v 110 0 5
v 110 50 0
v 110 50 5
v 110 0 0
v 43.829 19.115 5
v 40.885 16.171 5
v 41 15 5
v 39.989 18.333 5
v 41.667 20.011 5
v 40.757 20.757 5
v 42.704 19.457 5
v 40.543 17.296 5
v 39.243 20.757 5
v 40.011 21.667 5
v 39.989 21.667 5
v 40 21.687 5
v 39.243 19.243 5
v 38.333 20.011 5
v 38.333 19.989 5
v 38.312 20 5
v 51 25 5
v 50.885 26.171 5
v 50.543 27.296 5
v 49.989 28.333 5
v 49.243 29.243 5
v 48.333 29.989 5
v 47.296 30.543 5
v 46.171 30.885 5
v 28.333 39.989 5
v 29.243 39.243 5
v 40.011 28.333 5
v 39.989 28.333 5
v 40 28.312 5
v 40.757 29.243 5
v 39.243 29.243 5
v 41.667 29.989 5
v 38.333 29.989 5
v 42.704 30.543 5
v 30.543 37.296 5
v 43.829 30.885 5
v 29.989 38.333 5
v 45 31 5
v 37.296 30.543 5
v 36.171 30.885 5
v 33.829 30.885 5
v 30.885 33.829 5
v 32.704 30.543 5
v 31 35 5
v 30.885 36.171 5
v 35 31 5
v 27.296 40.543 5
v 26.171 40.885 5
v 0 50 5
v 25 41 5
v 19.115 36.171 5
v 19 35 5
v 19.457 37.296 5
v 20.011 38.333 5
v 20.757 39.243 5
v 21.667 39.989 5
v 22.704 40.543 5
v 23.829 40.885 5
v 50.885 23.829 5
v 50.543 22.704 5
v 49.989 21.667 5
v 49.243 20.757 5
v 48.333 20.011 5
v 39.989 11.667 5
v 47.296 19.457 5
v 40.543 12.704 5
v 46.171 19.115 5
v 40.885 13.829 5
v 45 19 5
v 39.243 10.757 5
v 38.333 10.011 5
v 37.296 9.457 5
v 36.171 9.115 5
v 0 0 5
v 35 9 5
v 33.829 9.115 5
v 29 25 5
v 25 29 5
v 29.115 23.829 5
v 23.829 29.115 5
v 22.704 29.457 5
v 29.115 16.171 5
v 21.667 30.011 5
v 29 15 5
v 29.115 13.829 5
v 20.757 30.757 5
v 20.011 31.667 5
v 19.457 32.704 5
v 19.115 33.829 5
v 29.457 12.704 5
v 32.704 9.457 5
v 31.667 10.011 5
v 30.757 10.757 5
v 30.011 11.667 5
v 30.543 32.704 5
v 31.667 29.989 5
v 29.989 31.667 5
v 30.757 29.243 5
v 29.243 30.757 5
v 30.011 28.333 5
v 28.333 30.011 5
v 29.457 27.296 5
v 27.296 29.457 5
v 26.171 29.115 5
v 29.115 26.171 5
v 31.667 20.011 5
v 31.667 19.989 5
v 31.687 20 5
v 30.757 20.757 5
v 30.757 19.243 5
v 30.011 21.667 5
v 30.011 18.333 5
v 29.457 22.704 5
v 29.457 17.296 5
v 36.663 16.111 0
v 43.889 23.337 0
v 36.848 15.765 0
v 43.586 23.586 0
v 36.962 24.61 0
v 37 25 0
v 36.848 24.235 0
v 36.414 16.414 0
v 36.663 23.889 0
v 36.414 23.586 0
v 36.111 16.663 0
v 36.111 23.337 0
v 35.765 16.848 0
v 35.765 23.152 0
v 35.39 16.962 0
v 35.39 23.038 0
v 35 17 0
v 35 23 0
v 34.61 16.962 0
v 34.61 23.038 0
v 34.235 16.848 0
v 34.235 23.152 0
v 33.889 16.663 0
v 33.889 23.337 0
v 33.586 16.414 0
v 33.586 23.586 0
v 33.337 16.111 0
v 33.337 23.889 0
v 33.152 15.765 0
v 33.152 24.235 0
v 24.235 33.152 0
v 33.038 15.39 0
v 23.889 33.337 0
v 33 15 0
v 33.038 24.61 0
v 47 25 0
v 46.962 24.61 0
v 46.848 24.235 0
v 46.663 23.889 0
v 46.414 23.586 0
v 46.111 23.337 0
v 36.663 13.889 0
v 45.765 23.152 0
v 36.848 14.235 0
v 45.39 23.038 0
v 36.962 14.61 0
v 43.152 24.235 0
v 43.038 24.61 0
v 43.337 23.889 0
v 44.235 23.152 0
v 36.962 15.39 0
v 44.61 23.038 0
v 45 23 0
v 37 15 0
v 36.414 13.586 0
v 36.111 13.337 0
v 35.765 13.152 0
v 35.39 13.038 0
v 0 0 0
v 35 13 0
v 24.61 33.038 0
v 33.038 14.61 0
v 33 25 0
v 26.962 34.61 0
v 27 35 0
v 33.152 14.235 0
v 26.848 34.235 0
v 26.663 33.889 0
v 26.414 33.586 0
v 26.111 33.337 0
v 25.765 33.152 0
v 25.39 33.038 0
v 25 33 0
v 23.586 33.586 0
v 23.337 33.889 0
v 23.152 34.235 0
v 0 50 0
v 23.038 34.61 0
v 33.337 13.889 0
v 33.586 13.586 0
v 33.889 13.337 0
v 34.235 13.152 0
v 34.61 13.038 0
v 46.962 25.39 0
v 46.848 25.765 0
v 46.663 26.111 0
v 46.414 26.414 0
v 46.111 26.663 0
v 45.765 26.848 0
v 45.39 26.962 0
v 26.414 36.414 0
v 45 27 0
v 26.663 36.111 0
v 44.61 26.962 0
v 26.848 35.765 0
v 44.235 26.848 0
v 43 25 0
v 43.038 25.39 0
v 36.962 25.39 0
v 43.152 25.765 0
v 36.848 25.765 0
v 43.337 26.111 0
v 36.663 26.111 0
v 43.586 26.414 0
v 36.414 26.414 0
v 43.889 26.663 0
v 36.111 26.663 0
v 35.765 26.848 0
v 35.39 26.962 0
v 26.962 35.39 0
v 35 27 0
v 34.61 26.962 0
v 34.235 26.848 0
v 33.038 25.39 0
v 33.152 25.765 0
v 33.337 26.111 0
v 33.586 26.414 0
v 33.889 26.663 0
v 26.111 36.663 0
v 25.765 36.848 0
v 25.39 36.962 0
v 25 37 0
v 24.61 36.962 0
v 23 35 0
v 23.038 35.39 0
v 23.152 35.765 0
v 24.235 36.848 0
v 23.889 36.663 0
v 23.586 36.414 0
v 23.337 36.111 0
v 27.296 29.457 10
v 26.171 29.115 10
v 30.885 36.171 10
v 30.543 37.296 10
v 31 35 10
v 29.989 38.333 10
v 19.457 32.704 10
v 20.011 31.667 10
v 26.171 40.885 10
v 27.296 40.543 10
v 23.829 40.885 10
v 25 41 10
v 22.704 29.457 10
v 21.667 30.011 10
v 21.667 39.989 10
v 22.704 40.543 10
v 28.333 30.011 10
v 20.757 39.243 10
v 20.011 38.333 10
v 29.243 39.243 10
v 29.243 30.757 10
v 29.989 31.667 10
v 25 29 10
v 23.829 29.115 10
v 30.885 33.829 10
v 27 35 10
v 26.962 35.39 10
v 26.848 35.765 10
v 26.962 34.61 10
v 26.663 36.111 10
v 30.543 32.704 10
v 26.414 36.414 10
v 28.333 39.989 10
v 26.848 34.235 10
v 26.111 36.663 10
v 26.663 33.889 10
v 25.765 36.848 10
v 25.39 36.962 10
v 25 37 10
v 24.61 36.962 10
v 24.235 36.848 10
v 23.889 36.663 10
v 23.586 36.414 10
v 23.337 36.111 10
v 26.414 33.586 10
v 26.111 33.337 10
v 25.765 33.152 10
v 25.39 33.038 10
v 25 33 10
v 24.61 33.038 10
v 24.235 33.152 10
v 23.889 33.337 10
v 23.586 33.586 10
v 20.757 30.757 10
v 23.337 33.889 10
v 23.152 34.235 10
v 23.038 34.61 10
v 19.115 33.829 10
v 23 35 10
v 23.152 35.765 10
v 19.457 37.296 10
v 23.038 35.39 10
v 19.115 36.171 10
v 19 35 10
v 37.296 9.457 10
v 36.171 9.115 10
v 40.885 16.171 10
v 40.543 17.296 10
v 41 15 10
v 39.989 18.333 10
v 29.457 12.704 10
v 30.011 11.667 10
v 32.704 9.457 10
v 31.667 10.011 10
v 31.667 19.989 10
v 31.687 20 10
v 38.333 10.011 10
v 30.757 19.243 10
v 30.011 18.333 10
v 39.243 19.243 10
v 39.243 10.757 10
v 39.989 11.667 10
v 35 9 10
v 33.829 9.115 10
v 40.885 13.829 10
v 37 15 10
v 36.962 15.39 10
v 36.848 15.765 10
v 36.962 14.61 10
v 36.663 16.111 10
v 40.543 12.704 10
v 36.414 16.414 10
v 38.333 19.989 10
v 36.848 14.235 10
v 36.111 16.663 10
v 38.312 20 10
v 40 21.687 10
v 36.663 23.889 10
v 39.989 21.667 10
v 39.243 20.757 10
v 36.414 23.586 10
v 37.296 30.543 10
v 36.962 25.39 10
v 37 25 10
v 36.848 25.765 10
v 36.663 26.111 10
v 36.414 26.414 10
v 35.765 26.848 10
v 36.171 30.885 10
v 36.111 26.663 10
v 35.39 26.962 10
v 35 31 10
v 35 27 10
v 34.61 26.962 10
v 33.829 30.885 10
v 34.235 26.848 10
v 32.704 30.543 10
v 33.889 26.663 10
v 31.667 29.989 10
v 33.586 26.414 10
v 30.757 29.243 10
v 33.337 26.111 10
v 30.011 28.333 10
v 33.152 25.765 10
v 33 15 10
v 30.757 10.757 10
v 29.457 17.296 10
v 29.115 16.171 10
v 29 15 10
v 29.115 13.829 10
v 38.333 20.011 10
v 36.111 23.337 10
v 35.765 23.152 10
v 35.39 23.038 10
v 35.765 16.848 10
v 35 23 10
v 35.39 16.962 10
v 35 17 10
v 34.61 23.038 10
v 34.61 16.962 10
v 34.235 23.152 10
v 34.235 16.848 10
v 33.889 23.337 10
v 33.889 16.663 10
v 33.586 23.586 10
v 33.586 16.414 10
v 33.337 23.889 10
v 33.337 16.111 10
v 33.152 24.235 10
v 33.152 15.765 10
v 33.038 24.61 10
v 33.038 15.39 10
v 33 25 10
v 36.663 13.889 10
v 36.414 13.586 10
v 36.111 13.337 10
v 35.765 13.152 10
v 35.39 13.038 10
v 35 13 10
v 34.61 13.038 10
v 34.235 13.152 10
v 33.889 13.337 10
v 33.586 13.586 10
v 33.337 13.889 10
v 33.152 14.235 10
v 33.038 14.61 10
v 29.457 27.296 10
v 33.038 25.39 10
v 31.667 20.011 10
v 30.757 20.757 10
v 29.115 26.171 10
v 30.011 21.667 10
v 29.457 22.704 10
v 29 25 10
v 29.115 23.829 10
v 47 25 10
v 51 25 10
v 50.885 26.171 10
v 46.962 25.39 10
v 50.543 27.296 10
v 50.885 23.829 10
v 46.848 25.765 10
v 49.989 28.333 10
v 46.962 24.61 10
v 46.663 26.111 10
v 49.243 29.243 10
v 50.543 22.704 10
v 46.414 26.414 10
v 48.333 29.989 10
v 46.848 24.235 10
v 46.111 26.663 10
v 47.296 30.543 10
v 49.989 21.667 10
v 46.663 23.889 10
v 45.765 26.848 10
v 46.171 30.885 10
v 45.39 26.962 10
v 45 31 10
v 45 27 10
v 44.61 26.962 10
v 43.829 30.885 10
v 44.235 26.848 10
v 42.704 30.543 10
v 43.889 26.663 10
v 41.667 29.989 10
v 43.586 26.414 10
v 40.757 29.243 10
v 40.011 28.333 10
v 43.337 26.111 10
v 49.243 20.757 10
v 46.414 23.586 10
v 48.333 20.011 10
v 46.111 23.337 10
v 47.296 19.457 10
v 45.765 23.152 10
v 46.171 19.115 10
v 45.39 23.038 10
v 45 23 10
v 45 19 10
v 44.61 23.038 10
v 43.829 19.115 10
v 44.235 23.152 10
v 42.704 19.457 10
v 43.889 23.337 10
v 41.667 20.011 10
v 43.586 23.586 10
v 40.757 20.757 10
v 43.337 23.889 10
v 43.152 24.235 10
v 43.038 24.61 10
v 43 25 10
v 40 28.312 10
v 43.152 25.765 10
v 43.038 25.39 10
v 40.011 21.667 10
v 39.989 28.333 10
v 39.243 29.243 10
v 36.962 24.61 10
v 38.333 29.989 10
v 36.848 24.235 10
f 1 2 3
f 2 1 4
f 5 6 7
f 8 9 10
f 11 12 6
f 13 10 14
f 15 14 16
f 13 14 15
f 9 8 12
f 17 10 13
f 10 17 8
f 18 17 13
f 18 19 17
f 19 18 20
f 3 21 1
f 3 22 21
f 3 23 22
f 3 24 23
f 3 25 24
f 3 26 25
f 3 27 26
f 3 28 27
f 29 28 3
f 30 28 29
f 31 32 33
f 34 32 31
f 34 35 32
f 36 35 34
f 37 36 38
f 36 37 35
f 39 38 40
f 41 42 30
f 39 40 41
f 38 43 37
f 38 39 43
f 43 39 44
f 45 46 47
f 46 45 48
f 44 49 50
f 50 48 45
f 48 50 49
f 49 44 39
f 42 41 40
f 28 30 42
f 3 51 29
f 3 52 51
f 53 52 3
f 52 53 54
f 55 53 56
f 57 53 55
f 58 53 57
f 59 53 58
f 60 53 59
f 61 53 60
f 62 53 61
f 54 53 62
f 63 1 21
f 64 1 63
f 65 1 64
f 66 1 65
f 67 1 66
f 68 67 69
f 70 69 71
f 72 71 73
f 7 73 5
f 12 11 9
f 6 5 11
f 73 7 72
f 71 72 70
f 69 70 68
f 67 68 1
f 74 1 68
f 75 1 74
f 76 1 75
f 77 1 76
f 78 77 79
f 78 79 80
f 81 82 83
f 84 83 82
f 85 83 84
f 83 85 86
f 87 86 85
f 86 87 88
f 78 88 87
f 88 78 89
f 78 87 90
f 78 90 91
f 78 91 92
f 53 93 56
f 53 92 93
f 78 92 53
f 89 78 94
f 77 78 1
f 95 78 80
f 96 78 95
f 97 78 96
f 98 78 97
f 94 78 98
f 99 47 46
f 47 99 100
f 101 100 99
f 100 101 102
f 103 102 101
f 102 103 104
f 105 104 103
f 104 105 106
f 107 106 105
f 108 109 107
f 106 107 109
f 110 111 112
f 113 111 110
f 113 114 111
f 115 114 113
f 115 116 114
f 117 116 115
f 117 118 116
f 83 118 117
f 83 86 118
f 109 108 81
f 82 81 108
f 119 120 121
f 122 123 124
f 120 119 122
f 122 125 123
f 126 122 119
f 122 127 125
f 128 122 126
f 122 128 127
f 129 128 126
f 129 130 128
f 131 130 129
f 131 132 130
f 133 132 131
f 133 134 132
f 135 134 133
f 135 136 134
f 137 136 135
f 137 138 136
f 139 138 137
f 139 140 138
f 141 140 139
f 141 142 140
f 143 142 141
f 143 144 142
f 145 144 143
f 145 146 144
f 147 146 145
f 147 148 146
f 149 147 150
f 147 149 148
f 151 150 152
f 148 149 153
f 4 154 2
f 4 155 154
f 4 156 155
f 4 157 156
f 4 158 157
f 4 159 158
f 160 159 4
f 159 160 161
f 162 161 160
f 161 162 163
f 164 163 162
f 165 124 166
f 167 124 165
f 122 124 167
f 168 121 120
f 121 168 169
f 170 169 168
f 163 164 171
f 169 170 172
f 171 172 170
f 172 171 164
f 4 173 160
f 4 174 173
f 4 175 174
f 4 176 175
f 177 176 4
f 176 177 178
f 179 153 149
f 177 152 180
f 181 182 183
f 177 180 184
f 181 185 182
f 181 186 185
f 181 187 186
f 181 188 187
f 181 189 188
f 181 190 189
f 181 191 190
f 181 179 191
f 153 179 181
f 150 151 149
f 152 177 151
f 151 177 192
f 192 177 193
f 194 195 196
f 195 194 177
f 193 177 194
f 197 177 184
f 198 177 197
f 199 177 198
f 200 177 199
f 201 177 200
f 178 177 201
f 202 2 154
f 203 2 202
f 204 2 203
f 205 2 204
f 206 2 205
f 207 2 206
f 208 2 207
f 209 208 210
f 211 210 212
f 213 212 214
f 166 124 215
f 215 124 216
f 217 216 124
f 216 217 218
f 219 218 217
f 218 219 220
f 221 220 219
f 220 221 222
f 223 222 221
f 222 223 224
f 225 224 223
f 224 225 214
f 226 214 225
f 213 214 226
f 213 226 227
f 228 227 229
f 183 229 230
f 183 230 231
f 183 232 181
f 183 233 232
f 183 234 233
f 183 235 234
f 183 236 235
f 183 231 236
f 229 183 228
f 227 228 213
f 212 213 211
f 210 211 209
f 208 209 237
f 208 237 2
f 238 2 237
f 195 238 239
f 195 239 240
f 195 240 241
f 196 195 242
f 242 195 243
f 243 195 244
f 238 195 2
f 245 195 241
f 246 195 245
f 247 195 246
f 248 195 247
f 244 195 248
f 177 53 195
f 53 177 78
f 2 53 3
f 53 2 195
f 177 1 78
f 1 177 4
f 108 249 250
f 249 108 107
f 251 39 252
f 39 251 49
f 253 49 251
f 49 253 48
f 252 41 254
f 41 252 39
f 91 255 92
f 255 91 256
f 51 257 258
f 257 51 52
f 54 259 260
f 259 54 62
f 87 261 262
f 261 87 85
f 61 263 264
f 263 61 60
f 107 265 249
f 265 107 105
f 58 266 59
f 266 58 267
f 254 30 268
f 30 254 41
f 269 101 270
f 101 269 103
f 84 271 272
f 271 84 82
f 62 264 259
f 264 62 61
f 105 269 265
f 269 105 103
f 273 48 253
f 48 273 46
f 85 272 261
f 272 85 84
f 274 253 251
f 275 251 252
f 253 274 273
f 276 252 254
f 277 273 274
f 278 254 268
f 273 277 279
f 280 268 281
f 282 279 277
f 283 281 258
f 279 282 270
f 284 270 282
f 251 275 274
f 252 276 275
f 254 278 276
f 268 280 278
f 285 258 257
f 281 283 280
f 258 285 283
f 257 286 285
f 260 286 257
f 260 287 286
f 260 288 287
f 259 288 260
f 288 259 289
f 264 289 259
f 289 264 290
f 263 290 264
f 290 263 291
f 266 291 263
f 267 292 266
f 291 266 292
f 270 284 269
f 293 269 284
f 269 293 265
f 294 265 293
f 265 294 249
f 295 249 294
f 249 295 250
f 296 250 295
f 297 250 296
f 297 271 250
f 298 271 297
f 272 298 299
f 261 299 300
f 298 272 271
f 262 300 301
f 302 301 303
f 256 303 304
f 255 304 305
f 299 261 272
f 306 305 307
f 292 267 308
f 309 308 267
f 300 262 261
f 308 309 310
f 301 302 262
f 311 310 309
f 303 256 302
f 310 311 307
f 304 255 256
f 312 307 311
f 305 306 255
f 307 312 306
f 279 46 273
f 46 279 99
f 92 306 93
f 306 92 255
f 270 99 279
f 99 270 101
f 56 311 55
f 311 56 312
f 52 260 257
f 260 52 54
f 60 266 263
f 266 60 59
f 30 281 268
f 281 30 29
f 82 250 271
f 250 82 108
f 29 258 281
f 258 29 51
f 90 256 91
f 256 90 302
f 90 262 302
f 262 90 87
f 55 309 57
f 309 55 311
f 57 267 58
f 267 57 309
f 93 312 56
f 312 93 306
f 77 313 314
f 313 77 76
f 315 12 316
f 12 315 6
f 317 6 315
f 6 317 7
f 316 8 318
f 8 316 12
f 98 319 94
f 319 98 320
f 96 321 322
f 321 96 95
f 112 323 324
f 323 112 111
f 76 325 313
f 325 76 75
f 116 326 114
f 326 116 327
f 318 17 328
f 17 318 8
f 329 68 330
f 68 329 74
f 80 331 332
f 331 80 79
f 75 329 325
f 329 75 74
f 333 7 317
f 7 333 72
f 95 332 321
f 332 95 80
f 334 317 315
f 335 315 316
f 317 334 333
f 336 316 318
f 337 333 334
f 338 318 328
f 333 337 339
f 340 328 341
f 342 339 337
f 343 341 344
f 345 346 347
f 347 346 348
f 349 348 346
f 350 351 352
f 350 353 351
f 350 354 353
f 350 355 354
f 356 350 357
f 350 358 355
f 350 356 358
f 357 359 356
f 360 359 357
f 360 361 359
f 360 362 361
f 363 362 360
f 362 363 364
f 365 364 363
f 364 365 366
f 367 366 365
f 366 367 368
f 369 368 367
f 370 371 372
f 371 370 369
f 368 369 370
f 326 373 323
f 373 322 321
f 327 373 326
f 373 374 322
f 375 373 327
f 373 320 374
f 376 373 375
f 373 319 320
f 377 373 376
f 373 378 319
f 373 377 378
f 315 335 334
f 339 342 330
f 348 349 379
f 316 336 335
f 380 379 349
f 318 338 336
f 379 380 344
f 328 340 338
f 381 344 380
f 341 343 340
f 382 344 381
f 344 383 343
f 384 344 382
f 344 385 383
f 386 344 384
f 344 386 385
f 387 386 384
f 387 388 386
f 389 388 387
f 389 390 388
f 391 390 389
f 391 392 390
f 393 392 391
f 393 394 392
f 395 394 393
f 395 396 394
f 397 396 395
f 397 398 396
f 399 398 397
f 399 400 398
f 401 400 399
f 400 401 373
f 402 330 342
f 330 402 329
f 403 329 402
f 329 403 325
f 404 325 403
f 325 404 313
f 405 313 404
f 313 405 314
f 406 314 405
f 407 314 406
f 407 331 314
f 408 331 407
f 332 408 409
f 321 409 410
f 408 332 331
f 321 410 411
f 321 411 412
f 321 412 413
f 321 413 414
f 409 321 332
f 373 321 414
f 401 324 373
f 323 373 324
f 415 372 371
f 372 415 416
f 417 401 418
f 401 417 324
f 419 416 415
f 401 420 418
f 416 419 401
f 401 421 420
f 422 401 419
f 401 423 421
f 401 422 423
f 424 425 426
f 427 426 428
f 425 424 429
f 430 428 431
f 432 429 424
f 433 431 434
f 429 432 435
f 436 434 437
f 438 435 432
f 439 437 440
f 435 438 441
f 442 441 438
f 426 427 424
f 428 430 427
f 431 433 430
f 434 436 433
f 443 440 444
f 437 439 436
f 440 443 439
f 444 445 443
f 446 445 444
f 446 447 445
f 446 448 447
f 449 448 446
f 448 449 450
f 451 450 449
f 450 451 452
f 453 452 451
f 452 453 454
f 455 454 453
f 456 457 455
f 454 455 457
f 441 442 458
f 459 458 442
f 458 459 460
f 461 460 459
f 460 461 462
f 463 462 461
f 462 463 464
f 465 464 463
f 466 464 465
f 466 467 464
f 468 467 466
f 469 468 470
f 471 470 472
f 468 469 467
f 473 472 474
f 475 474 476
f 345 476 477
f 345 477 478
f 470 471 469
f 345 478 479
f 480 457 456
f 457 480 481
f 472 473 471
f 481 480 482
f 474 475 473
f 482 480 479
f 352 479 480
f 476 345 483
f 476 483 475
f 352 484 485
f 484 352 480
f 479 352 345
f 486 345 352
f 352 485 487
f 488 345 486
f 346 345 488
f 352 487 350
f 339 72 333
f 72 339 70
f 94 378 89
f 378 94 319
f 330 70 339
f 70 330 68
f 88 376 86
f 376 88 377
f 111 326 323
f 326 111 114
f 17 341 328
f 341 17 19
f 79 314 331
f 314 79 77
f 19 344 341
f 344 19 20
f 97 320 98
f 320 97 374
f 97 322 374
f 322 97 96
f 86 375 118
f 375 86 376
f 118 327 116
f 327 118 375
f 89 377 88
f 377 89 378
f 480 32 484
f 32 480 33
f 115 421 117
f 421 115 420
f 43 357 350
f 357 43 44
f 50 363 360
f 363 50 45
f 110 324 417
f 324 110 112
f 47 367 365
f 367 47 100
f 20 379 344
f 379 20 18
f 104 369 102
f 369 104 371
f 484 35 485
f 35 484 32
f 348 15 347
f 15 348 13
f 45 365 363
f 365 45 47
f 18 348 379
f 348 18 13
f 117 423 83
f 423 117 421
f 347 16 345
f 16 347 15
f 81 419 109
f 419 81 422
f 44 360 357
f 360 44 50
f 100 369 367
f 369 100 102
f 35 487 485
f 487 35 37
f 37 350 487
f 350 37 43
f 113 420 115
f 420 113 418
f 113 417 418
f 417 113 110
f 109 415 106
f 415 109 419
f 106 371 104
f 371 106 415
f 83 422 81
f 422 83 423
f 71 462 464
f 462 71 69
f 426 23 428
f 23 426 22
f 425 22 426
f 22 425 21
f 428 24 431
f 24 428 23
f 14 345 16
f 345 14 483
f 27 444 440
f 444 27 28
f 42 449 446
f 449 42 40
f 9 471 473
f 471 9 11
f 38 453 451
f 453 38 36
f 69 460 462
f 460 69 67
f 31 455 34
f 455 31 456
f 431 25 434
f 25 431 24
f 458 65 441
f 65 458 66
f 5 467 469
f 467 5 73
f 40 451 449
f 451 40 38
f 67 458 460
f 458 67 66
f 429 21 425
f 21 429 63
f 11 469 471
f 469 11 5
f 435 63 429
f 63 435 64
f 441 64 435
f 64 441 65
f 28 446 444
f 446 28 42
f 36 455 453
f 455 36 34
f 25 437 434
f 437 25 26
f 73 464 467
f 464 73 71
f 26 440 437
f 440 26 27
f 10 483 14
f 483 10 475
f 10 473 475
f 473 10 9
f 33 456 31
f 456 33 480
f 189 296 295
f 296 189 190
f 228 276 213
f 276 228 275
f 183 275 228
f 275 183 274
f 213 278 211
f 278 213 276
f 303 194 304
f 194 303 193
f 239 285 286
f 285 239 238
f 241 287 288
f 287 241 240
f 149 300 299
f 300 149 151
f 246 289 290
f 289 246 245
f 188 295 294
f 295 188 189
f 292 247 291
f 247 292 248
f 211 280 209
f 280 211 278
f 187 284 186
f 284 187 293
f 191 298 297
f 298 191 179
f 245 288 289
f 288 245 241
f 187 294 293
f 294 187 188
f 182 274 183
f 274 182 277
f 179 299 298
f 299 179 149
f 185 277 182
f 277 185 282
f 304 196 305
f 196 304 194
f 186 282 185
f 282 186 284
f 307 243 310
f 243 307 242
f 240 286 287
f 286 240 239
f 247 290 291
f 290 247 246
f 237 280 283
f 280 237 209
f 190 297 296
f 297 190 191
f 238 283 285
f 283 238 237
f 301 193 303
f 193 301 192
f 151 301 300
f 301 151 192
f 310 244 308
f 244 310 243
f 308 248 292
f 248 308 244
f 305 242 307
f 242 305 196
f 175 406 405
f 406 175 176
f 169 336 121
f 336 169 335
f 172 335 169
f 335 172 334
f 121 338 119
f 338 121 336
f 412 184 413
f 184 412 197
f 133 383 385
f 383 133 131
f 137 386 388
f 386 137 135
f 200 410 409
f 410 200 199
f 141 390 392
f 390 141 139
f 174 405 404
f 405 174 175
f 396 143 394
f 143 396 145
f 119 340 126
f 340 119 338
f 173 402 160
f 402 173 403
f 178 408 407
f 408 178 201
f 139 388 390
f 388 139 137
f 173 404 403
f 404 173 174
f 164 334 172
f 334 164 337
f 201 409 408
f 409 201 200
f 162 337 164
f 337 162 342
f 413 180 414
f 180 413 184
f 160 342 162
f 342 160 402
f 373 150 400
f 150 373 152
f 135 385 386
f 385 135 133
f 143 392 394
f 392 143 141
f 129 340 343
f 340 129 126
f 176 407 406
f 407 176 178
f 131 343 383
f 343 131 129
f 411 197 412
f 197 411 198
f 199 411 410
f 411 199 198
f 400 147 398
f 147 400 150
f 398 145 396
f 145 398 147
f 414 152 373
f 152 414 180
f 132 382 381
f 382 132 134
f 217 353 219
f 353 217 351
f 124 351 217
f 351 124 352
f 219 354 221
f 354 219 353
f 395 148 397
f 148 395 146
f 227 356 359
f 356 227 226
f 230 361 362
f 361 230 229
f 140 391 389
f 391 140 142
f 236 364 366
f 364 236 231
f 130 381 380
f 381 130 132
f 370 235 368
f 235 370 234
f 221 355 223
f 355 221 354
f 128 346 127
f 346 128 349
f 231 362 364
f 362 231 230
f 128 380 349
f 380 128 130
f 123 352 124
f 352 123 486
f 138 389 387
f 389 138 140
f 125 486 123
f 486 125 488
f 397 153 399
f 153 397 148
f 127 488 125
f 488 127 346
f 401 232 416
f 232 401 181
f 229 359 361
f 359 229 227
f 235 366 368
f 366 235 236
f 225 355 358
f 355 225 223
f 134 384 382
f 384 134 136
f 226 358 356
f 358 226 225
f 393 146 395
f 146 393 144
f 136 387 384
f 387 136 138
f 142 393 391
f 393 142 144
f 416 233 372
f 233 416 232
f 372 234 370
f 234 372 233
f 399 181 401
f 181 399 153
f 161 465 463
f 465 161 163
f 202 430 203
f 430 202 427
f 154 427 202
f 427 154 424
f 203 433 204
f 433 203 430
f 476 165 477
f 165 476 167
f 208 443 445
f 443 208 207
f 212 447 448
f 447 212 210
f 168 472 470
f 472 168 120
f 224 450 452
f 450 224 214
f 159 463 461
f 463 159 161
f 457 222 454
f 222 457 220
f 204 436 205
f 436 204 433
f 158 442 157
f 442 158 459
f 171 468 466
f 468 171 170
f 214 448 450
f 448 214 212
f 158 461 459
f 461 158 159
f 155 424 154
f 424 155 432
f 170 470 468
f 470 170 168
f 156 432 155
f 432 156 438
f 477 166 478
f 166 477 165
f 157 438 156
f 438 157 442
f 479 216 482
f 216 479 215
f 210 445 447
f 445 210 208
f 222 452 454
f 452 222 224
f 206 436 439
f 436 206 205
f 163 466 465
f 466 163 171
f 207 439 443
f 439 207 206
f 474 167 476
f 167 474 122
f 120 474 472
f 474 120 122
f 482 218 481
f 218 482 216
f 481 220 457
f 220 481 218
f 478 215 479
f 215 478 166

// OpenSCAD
$fn = 32;

// ----------------------------------------------------------------------
// Boss field: plate with bosses at given coordinates
// ----------------------------------------------------------------------

// --- parameters (mm) ---
plate_l = 110;            // plate length, X
plate_w = 50;             // plate width, Y
plate_t = 5;              // plate thickness, Z
boss_d = 12;              // boss diameter
boss_h = 5;               // boss height above the plate
bore_d = 4;               // boss bore

total_h = plate_t + boss_h;  // overall height

difference() {
  union() {
    cube([plate_l, plate_w, plate_t]);
    translate([25, 35, plate_t]) cylinder(h = boss_h, d = boss_d);
    translate([35, 15, plate_t]) cylinder(h = boss_h, d = boss_d);
    translate([35, 25, plate_t]) cylinder(h = boss_h, d = boss_d);
    translate([45, 25, plate_t]) cylinder(h = boss_h, d = boss_d);
  }
  translate([25, 35, -1]) cylinder(h = total_h + 2, d = bore_d);
  translate([35, 15, -1]) cylinder(h = total_h + 2, d = bore_d);
  translate([35, 25, -1]) cylinder(h = total_h + 2, d = bore_d);
  translate([45, 25, -1]) cylinder(h = total_h + 2, d = bore_d);
}
